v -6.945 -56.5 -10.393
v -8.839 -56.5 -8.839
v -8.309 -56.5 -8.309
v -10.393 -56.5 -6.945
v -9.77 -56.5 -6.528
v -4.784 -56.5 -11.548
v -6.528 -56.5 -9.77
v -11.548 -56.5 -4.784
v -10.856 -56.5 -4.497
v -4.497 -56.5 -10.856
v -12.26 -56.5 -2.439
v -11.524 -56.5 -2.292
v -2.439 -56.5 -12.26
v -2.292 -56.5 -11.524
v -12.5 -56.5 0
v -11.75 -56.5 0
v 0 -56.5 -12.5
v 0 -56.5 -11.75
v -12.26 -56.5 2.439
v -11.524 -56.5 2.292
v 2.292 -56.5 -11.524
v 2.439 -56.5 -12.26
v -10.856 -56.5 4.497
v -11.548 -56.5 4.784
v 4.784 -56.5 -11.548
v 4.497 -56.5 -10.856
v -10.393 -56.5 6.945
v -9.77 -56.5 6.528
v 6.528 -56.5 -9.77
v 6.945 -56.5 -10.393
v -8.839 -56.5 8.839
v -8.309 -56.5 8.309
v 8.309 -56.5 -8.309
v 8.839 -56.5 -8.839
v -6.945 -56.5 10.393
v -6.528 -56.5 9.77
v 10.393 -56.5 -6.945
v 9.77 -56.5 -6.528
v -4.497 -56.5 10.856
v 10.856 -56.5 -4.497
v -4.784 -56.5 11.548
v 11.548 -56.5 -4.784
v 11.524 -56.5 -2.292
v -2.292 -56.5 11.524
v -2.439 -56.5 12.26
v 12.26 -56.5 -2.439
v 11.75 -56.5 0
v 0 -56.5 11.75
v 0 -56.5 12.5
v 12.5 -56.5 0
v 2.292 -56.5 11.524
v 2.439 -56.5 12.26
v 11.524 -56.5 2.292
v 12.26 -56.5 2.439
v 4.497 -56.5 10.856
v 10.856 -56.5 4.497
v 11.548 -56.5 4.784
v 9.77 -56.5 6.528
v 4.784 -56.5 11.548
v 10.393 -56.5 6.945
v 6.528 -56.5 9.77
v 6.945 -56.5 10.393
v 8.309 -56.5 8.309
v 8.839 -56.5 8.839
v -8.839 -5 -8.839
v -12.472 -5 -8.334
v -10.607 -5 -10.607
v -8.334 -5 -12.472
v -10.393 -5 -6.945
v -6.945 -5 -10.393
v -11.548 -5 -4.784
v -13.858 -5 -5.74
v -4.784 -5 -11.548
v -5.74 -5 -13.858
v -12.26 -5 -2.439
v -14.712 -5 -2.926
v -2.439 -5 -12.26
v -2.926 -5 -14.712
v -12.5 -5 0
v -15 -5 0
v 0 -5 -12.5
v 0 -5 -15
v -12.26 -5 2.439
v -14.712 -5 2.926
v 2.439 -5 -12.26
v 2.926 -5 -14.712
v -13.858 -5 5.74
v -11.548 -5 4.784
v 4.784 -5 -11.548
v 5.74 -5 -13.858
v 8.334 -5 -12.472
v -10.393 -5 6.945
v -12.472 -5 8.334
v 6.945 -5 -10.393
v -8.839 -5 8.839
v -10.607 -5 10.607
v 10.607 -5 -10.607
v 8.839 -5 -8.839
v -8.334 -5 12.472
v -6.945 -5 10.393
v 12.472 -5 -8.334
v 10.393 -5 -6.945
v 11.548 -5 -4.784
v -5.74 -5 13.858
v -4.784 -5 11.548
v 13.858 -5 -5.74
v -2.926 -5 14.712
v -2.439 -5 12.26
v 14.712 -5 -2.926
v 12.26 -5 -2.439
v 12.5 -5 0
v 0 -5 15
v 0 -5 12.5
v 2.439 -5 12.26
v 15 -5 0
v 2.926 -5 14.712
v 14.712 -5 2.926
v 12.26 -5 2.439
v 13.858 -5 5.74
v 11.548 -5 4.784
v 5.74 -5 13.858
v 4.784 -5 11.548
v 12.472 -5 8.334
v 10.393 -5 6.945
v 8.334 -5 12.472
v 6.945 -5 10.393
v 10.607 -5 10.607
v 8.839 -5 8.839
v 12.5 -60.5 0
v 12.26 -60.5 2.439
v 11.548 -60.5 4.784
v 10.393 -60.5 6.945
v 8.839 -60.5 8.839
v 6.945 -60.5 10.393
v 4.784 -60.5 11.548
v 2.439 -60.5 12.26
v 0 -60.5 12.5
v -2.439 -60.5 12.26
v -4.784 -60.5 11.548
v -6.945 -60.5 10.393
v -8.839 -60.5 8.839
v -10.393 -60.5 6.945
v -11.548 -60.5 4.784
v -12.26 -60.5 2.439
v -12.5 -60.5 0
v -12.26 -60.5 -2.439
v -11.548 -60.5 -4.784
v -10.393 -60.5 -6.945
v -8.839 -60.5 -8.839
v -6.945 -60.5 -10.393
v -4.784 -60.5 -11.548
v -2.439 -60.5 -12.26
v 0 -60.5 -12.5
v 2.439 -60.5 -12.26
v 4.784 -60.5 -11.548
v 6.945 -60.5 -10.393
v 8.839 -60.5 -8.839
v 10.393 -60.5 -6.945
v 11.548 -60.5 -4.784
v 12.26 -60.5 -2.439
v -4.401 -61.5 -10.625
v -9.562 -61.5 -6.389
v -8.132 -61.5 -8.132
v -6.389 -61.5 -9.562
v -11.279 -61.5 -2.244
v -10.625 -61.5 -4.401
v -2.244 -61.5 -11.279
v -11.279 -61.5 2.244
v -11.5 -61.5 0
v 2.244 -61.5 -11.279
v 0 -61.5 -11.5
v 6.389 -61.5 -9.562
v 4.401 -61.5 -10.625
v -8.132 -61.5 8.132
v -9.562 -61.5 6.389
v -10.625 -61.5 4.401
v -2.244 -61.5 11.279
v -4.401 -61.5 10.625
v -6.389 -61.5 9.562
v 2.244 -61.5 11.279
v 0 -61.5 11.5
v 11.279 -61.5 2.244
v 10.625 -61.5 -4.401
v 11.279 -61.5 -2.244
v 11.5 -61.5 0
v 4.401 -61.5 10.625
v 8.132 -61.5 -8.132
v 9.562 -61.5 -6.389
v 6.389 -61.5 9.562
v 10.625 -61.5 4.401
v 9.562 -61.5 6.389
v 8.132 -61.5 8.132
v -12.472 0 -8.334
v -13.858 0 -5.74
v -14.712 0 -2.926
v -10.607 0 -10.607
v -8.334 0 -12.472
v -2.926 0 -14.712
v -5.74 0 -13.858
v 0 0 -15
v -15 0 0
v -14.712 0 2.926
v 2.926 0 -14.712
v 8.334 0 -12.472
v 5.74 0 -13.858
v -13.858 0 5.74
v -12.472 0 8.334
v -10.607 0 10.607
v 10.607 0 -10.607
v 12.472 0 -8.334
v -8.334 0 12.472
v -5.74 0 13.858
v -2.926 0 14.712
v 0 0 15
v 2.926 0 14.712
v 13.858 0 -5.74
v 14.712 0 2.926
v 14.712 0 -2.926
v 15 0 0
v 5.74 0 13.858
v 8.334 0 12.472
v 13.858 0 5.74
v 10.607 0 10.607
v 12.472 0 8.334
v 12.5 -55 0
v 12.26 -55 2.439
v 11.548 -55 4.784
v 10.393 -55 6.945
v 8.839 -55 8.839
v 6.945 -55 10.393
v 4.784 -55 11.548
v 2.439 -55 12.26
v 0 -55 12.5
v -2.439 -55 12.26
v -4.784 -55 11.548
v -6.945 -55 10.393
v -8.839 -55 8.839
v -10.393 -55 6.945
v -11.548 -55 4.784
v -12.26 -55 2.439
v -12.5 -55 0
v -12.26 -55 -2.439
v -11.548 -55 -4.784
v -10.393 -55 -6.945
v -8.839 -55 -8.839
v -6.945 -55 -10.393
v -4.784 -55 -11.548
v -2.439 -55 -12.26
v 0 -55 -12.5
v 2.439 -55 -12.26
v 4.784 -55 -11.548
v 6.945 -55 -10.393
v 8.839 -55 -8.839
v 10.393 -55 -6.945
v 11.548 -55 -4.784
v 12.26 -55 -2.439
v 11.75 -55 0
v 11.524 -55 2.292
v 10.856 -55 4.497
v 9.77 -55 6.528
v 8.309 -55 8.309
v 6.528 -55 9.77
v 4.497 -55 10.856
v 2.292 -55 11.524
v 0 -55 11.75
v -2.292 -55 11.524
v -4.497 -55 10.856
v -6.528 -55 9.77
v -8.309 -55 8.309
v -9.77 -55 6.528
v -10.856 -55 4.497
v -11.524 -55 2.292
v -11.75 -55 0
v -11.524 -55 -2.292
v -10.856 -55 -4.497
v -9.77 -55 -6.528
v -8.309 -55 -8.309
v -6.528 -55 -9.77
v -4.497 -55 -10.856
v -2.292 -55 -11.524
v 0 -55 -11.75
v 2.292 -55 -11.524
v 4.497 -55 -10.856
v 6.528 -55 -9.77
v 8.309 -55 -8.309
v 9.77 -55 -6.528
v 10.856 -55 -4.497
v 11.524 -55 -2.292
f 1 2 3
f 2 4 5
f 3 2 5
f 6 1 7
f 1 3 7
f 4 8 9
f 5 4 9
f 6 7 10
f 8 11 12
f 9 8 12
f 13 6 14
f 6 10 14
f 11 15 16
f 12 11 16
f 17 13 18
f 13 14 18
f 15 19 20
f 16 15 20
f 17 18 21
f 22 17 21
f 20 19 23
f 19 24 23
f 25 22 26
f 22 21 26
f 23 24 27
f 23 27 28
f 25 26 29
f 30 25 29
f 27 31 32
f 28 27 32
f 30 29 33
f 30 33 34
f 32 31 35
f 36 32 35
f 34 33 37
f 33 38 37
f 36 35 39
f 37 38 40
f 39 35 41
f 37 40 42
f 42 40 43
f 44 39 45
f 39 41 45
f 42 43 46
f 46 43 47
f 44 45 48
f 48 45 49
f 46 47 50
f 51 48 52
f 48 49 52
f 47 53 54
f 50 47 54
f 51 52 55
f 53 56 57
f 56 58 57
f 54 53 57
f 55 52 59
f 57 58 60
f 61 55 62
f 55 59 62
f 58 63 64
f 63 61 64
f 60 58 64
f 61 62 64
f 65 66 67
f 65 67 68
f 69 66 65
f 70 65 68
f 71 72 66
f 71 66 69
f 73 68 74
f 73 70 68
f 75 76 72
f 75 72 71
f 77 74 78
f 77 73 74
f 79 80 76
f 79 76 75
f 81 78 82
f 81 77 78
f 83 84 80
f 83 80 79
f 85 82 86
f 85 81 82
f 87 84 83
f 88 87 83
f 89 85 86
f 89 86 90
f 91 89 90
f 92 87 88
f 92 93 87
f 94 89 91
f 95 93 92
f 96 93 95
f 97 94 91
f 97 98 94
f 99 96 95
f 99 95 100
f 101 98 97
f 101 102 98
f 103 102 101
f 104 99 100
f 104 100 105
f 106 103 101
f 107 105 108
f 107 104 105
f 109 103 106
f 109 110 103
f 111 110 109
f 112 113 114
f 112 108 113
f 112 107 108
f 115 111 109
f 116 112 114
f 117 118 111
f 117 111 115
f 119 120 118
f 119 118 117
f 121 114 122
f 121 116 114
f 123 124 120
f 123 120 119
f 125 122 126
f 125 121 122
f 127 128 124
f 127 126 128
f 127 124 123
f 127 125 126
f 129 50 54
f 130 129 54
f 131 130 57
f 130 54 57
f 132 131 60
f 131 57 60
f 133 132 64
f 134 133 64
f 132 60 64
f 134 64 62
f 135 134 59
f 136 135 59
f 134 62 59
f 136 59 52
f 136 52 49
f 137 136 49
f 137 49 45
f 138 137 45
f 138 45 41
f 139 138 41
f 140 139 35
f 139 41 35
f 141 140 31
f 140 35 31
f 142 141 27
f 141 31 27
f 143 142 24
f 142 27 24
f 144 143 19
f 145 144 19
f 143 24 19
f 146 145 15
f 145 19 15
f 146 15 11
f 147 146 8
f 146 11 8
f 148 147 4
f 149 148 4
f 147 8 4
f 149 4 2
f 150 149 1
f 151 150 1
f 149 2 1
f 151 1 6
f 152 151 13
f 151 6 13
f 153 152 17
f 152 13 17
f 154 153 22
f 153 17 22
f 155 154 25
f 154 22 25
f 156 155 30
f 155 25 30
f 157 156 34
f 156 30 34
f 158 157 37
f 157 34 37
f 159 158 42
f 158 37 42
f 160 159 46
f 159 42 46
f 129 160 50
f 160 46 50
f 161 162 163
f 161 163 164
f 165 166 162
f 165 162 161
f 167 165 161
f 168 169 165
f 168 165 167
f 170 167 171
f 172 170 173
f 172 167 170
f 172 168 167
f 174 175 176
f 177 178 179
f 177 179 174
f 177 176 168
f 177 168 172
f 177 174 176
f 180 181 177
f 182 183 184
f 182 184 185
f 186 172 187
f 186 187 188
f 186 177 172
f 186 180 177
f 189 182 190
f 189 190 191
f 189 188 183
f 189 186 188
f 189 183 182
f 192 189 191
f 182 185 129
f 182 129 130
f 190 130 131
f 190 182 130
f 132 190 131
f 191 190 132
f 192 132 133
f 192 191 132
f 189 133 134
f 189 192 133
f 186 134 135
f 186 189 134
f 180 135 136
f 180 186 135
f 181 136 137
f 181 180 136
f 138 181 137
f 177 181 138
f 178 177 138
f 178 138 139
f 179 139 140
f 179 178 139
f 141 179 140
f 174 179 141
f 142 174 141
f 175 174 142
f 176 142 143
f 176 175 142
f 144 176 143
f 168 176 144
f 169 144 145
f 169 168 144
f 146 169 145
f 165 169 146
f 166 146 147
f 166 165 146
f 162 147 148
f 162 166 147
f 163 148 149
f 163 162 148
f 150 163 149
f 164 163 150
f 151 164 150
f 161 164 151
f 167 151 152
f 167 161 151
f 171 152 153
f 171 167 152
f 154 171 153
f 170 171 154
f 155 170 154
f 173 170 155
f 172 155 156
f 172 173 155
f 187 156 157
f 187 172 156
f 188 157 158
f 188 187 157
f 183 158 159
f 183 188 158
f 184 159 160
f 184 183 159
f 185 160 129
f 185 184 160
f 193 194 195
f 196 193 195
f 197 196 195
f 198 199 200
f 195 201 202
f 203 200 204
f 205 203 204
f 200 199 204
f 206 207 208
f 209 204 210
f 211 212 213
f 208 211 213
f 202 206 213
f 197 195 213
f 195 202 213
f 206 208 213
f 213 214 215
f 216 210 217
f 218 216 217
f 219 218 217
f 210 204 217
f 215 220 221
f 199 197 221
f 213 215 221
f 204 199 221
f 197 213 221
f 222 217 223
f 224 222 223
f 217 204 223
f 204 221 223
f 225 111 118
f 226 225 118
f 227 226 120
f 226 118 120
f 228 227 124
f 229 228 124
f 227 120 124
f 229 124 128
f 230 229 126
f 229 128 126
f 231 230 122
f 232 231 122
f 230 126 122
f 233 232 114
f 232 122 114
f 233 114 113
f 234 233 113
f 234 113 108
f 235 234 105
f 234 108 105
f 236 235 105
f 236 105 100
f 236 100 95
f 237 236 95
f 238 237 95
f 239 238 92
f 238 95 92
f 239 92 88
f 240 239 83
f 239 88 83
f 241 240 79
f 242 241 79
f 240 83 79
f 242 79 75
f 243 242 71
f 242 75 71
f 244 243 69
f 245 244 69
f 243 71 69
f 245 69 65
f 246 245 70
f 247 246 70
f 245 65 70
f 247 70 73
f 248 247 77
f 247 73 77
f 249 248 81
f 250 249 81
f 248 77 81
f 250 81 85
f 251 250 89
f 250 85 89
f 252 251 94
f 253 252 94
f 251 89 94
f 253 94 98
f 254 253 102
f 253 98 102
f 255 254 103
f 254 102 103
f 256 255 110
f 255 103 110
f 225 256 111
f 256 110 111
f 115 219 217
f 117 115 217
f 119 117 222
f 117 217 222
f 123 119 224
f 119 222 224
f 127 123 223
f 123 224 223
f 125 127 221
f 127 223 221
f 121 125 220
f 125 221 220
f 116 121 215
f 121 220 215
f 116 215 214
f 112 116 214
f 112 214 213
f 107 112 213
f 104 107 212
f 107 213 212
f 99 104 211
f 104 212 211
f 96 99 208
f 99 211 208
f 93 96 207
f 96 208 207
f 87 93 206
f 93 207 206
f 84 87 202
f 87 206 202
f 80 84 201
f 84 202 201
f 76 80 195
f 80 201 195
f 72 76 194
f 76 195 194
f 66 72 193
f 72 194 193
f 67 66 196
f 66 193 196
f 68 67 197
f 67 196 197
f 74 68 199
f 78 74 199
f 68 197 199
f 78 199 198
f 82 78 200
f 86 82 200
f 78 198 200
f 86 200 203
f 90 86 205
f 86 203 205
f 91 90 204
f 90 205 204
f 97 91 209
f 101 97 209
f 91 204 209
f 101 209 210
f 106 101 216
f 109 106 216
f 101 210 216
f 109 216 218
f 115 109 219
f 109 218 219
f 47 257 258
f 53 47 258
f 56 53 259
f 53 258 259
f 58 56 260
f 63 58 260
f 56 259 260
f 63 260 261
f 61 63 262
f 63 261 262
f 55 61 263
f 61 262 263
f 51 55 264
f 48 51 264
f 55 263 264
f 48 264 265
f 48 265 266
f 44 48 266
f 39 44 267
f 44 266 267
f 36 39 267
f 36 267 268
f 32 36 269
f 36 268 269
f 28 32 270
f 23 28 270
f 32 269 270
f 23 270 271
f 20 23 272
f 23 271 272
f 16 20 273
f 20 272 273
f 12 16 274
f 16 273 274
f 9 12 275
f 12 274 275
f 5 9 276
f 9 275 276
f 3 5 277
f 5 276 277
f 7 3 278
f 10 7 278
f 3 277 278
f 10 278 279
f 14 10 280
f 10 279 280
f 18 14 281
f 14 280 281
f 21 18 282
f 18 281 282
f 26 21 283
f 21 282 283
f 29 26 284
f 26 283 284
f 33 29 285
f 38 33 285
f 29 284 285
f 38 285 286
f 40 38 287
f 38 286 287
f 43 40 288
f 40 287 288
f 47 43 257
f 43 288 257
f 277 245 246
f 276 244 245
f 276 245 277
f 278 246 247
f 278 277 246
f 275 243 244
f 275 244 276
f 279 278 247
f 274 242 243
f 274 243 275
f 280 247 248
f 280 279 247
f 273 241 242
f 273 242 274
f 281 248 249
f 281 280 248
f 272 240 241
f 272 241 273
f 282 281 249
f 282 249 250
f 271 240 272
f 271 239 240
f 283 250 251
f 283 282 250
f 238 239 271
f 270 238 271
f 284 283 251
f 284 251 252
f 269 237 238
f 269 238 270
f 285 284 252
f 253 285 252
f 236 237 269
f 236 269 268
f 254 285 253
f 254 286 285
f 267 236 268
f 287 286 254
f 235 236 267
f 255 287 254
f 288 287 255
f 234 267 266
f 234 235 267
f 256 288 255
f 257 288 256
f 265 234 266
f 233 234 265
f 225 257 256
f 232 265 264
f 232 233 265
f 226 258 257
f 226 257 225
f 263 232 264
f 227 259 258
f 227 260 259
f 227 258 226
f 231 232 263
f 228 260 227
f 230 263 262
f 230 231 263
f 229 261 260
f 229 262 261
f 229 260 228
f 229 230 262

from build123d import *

# Parameters (mm, degrees)
F0_R     = 15
F1_DEPTH = 5
F2_R     = 12.5
F3_DEPTH = 50
F4_R     = 11.75
F5_DEPTH = 1.5
F7_R     = 12.5
F8_DEPTH = 5
F9_SIZE  = 1


with BuildPart() as f1:
    # F0 (on Front) → F1 (new body)
    with BuildSketch(Plane.XZ):
        Circle(F0_R)
    extrude(amount=F1_DEPTH)

    # F2 (on face) → F3 (join)
    with BuildSketch(Plane.XZ.offset(5)):
        Circle(F2_R)
    extrude(amount=F3_DEPTH)

    # F4 (on face) → F5 (join)
    with BuildSketch(Plane.XZ.offset(55)):
        Circle(F4_R)
    extrude(amount=F5_DEPTH)

    # F7 (on face) → F8 (join)
    with BuildSketch(Plane.XZ.offset(56.5)):
        Circle(F7_R)
    extrude(amount=F8_DEPTH)

    # F9
    f9_edges = [f1.edges().sort_by_distance(p)[0] for p in [
        (-12.5, -61.5, 0),
    ]]
    chamfer(f9_edges, length=F9_SIZE)


solid = f1.part
